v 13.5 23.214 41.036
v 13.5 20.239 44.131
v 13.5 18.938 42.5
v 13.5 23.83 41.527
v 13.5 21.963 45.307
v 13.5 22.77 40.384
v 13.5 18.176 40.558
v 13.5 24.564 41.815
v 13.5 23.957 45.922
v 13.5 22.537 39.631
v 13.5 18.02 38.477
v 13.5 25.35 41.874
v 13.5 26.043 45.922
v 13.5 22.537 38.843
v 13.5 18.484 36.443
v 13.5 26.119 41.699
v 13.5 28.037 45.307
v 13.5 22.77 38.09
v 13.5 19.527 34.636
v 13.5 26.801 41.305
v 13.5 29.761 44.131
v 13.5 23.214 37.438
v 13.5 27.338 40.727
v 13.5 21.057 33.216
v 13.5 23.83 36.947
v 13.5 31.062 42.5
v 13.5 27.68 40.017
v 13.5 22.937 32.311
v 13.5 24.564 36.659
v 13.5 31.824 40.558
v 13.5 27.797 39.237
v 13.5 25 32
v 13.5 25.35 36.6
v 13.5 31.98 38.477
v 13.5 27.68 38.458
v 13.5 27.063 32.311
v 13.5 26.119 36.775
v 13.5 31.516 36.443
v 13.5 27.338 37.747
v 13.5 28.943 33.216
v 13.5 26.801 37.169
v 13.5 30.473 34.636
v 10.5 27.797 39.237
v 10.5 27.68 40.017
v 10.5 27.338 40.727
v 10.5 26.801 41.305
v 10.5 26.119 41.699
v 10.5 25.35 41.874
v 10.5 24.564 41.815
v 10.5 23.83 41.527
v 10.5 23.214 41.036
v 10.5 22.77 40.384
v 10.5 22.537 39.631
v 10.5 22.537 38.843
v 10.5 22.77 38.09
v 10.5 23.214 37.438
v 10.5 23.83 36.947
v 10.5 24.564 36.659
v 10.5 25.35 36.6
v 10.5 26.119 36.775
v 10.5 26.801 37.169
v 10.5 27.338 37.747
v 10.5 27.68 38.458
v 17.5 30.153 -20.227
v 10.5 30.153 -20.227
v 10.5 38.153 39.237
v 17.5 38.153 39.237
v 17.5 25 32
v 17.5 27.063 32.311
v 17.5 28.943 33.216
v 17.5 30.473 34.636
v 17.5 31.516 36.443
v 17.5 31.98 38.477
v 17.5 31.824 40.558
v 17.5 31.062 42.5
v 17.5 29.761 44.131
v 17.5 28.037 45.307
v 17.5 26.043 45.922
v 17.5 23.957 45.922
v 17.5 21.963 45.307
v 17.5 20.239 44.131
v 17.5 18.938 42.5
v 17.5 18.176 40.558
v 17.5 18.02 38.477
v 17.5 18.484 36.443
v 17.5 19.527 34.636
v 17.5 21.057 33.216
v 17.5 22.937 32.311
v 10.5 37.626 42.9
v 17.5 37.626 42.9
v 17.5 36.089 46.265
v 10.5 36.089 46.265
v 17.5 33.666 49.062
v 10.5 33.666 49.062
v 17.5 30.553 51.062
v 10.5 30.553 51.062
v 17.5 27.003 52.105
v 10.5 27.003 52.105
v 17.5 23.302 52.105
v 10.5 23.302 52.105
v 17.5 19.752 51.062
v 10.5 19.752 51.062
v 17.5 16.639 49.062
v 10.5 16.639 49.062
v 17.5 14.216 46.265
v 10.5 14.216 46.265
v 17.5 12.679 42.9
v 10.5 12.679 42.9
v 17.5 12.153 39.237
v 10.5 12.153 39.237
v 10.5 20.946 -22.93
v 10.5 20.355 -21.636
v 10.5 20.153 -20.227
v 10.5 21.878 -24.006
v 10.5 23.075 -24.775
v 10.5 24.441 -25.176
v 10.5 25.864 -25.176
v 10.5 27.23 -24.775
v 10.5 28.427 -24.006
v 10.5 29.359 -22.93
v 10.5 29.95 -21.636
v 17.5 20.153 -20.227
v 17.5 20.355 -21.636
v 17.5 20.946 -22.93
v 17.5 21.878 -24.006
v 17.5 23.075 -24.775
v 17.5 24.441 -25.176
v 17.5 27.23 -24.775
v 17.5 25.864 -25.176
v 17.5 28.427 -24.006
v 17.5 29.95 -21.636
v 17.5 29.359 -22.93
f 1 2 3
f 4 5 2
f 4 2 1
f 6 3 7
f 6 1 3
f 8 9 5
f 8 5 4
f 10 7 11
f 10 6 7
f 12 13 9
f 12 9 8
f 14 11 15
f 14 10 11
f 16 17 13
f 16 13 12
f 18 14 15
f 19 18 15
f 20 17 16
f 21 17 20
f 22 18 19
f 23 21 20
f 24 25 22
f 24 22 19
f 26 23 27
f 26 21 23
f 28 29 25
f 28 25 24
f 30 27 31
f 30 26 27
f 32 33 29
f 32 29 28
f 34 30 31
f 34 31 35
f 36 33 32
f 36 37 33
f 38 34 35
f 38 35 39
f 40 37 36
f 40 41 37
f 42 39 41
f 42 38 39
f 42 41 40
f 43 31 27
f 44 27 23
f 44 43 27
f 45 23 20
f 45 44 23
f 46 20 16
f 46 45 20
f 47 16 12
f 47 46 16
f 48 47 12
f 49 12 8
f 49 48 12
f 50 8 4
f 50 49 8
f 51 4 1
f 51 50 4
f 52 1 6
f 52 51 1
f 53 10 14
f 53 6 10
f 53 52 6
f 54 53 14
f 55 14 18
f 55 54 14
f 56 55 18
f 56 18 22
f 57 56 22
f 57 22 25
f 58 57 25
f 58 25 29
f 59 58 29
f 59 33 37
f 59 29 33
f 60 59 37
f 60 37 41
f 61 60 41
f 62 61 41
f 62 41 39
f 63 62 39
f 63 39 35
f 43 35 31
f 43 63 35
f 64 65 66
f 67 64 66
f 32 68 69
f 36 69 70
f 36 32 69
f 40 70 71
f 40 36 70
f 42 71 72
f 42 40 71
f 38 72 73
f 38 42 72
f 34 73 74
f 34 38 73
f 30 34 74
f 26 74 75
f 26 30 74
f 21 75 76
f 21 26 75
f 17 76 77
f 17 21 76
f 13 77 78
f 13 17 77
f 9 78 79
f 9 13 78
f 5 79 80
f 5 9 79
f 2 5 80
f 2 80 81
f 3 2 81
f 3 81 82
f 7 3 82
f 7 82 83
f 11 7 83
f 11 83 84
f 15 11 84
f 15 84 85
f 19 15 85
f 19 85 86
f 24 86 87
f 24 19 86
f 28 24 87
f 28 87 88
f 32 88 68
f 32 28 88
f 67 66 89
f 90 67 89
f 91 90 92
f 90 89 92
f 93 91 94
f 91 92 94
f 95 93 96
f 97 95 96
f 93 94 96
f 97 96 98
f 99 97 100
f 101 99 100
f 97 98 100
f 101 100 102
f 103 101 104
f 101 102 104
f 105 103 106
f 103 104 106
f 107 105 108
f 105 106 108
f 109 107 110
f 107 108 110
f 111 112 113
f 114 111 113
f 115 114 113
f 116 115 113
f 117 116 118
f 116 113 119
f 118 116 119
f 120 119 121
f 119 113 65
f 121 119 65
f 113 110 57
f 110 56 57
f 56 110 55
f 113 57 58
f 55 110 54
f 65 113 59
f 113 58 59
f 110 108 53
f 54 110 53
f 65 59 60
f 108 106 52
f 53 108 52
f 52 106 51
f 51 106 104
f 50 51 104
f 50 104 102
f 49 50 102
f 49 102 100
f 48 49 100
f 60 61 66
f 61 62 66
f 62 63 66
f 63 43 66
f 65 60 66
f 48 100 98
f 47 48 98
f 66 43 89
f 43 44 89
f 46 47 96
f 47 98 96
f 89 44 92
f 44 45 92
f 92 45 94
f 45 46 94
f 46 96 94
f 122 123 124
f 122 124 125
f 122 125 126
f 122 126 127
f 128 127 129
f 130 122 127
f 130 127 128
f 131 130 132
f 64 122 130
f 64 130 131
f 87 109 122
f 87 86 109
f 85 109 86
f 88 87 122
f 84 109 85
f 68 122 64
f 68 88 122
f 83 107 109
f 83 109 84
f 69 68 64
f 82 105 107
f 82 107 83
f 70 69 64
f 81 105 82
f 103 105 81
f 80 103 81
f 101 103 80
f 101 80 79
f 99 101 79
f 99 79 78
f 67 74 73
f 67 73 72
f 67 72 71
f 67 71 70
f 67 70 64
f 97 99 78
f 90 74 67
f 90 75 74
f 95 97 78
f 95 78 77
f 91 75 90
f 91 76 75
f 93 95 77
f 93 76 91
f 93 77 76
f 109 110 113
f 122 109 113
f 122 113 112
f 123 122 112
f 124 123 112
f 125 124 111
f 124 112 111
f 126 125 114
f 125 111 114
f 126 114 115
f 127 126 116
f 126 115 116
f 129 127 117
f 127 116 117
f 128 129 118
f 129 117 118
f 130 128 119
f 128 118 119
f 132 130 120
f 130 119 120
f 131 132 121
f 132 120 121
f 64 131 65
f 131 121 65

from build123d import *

# Parameters (mm, degrees)
CYLINDER_R     = 7
CYLINDER_DEPTH = 5
SKETCH_R       = 2.644595
PAD_DEPTH      = 7


with BuildPart() as cylinder:
    # Cylinder → Cylinder (new body)
    with BuildSketch(Plane(origin=(13.5, 25, 39), x_dir=(0, 0, -1), z_dir=(1, 0, 0))):
        Circle(CYLINDER_R)
    extrude(amount=CYLINDER_DEPTH)


with BuildPart() as cut:
    # Sketch → Pad (new body)
    with BuildSketch(Plane.YZ):
        with BuildLine():
            Line((12.552548, 39.037066), (20.552548, -20.427209))
            ThreePointArc((20.552548, -20.427209), (25.552548, -25.427189), (30.552548, -20.427209))
            Line((30.552548, -20.427209), (38.552548, 39.037066))
            ThreePointArc((38.552548, 39.037066), (25.552548, 52.03702), (12.552548, 39.037066))
        make_face()
        with Locations((25.552548, 39.03702)):
            Circle(SKETCH_R, mode=Mode.SUBTRACT)
    extrude(amount=PAD_DEPTH)


with BuildPart() as cut_1:
    # Body placement: moved
    add(cut.part.moved(Location((10.5, -0.4, 0.2))))

    # Cut: cut Cylinder
    add(cylinder.part, mode=Mode.SUBTRACT)


solid = cut_1.part
